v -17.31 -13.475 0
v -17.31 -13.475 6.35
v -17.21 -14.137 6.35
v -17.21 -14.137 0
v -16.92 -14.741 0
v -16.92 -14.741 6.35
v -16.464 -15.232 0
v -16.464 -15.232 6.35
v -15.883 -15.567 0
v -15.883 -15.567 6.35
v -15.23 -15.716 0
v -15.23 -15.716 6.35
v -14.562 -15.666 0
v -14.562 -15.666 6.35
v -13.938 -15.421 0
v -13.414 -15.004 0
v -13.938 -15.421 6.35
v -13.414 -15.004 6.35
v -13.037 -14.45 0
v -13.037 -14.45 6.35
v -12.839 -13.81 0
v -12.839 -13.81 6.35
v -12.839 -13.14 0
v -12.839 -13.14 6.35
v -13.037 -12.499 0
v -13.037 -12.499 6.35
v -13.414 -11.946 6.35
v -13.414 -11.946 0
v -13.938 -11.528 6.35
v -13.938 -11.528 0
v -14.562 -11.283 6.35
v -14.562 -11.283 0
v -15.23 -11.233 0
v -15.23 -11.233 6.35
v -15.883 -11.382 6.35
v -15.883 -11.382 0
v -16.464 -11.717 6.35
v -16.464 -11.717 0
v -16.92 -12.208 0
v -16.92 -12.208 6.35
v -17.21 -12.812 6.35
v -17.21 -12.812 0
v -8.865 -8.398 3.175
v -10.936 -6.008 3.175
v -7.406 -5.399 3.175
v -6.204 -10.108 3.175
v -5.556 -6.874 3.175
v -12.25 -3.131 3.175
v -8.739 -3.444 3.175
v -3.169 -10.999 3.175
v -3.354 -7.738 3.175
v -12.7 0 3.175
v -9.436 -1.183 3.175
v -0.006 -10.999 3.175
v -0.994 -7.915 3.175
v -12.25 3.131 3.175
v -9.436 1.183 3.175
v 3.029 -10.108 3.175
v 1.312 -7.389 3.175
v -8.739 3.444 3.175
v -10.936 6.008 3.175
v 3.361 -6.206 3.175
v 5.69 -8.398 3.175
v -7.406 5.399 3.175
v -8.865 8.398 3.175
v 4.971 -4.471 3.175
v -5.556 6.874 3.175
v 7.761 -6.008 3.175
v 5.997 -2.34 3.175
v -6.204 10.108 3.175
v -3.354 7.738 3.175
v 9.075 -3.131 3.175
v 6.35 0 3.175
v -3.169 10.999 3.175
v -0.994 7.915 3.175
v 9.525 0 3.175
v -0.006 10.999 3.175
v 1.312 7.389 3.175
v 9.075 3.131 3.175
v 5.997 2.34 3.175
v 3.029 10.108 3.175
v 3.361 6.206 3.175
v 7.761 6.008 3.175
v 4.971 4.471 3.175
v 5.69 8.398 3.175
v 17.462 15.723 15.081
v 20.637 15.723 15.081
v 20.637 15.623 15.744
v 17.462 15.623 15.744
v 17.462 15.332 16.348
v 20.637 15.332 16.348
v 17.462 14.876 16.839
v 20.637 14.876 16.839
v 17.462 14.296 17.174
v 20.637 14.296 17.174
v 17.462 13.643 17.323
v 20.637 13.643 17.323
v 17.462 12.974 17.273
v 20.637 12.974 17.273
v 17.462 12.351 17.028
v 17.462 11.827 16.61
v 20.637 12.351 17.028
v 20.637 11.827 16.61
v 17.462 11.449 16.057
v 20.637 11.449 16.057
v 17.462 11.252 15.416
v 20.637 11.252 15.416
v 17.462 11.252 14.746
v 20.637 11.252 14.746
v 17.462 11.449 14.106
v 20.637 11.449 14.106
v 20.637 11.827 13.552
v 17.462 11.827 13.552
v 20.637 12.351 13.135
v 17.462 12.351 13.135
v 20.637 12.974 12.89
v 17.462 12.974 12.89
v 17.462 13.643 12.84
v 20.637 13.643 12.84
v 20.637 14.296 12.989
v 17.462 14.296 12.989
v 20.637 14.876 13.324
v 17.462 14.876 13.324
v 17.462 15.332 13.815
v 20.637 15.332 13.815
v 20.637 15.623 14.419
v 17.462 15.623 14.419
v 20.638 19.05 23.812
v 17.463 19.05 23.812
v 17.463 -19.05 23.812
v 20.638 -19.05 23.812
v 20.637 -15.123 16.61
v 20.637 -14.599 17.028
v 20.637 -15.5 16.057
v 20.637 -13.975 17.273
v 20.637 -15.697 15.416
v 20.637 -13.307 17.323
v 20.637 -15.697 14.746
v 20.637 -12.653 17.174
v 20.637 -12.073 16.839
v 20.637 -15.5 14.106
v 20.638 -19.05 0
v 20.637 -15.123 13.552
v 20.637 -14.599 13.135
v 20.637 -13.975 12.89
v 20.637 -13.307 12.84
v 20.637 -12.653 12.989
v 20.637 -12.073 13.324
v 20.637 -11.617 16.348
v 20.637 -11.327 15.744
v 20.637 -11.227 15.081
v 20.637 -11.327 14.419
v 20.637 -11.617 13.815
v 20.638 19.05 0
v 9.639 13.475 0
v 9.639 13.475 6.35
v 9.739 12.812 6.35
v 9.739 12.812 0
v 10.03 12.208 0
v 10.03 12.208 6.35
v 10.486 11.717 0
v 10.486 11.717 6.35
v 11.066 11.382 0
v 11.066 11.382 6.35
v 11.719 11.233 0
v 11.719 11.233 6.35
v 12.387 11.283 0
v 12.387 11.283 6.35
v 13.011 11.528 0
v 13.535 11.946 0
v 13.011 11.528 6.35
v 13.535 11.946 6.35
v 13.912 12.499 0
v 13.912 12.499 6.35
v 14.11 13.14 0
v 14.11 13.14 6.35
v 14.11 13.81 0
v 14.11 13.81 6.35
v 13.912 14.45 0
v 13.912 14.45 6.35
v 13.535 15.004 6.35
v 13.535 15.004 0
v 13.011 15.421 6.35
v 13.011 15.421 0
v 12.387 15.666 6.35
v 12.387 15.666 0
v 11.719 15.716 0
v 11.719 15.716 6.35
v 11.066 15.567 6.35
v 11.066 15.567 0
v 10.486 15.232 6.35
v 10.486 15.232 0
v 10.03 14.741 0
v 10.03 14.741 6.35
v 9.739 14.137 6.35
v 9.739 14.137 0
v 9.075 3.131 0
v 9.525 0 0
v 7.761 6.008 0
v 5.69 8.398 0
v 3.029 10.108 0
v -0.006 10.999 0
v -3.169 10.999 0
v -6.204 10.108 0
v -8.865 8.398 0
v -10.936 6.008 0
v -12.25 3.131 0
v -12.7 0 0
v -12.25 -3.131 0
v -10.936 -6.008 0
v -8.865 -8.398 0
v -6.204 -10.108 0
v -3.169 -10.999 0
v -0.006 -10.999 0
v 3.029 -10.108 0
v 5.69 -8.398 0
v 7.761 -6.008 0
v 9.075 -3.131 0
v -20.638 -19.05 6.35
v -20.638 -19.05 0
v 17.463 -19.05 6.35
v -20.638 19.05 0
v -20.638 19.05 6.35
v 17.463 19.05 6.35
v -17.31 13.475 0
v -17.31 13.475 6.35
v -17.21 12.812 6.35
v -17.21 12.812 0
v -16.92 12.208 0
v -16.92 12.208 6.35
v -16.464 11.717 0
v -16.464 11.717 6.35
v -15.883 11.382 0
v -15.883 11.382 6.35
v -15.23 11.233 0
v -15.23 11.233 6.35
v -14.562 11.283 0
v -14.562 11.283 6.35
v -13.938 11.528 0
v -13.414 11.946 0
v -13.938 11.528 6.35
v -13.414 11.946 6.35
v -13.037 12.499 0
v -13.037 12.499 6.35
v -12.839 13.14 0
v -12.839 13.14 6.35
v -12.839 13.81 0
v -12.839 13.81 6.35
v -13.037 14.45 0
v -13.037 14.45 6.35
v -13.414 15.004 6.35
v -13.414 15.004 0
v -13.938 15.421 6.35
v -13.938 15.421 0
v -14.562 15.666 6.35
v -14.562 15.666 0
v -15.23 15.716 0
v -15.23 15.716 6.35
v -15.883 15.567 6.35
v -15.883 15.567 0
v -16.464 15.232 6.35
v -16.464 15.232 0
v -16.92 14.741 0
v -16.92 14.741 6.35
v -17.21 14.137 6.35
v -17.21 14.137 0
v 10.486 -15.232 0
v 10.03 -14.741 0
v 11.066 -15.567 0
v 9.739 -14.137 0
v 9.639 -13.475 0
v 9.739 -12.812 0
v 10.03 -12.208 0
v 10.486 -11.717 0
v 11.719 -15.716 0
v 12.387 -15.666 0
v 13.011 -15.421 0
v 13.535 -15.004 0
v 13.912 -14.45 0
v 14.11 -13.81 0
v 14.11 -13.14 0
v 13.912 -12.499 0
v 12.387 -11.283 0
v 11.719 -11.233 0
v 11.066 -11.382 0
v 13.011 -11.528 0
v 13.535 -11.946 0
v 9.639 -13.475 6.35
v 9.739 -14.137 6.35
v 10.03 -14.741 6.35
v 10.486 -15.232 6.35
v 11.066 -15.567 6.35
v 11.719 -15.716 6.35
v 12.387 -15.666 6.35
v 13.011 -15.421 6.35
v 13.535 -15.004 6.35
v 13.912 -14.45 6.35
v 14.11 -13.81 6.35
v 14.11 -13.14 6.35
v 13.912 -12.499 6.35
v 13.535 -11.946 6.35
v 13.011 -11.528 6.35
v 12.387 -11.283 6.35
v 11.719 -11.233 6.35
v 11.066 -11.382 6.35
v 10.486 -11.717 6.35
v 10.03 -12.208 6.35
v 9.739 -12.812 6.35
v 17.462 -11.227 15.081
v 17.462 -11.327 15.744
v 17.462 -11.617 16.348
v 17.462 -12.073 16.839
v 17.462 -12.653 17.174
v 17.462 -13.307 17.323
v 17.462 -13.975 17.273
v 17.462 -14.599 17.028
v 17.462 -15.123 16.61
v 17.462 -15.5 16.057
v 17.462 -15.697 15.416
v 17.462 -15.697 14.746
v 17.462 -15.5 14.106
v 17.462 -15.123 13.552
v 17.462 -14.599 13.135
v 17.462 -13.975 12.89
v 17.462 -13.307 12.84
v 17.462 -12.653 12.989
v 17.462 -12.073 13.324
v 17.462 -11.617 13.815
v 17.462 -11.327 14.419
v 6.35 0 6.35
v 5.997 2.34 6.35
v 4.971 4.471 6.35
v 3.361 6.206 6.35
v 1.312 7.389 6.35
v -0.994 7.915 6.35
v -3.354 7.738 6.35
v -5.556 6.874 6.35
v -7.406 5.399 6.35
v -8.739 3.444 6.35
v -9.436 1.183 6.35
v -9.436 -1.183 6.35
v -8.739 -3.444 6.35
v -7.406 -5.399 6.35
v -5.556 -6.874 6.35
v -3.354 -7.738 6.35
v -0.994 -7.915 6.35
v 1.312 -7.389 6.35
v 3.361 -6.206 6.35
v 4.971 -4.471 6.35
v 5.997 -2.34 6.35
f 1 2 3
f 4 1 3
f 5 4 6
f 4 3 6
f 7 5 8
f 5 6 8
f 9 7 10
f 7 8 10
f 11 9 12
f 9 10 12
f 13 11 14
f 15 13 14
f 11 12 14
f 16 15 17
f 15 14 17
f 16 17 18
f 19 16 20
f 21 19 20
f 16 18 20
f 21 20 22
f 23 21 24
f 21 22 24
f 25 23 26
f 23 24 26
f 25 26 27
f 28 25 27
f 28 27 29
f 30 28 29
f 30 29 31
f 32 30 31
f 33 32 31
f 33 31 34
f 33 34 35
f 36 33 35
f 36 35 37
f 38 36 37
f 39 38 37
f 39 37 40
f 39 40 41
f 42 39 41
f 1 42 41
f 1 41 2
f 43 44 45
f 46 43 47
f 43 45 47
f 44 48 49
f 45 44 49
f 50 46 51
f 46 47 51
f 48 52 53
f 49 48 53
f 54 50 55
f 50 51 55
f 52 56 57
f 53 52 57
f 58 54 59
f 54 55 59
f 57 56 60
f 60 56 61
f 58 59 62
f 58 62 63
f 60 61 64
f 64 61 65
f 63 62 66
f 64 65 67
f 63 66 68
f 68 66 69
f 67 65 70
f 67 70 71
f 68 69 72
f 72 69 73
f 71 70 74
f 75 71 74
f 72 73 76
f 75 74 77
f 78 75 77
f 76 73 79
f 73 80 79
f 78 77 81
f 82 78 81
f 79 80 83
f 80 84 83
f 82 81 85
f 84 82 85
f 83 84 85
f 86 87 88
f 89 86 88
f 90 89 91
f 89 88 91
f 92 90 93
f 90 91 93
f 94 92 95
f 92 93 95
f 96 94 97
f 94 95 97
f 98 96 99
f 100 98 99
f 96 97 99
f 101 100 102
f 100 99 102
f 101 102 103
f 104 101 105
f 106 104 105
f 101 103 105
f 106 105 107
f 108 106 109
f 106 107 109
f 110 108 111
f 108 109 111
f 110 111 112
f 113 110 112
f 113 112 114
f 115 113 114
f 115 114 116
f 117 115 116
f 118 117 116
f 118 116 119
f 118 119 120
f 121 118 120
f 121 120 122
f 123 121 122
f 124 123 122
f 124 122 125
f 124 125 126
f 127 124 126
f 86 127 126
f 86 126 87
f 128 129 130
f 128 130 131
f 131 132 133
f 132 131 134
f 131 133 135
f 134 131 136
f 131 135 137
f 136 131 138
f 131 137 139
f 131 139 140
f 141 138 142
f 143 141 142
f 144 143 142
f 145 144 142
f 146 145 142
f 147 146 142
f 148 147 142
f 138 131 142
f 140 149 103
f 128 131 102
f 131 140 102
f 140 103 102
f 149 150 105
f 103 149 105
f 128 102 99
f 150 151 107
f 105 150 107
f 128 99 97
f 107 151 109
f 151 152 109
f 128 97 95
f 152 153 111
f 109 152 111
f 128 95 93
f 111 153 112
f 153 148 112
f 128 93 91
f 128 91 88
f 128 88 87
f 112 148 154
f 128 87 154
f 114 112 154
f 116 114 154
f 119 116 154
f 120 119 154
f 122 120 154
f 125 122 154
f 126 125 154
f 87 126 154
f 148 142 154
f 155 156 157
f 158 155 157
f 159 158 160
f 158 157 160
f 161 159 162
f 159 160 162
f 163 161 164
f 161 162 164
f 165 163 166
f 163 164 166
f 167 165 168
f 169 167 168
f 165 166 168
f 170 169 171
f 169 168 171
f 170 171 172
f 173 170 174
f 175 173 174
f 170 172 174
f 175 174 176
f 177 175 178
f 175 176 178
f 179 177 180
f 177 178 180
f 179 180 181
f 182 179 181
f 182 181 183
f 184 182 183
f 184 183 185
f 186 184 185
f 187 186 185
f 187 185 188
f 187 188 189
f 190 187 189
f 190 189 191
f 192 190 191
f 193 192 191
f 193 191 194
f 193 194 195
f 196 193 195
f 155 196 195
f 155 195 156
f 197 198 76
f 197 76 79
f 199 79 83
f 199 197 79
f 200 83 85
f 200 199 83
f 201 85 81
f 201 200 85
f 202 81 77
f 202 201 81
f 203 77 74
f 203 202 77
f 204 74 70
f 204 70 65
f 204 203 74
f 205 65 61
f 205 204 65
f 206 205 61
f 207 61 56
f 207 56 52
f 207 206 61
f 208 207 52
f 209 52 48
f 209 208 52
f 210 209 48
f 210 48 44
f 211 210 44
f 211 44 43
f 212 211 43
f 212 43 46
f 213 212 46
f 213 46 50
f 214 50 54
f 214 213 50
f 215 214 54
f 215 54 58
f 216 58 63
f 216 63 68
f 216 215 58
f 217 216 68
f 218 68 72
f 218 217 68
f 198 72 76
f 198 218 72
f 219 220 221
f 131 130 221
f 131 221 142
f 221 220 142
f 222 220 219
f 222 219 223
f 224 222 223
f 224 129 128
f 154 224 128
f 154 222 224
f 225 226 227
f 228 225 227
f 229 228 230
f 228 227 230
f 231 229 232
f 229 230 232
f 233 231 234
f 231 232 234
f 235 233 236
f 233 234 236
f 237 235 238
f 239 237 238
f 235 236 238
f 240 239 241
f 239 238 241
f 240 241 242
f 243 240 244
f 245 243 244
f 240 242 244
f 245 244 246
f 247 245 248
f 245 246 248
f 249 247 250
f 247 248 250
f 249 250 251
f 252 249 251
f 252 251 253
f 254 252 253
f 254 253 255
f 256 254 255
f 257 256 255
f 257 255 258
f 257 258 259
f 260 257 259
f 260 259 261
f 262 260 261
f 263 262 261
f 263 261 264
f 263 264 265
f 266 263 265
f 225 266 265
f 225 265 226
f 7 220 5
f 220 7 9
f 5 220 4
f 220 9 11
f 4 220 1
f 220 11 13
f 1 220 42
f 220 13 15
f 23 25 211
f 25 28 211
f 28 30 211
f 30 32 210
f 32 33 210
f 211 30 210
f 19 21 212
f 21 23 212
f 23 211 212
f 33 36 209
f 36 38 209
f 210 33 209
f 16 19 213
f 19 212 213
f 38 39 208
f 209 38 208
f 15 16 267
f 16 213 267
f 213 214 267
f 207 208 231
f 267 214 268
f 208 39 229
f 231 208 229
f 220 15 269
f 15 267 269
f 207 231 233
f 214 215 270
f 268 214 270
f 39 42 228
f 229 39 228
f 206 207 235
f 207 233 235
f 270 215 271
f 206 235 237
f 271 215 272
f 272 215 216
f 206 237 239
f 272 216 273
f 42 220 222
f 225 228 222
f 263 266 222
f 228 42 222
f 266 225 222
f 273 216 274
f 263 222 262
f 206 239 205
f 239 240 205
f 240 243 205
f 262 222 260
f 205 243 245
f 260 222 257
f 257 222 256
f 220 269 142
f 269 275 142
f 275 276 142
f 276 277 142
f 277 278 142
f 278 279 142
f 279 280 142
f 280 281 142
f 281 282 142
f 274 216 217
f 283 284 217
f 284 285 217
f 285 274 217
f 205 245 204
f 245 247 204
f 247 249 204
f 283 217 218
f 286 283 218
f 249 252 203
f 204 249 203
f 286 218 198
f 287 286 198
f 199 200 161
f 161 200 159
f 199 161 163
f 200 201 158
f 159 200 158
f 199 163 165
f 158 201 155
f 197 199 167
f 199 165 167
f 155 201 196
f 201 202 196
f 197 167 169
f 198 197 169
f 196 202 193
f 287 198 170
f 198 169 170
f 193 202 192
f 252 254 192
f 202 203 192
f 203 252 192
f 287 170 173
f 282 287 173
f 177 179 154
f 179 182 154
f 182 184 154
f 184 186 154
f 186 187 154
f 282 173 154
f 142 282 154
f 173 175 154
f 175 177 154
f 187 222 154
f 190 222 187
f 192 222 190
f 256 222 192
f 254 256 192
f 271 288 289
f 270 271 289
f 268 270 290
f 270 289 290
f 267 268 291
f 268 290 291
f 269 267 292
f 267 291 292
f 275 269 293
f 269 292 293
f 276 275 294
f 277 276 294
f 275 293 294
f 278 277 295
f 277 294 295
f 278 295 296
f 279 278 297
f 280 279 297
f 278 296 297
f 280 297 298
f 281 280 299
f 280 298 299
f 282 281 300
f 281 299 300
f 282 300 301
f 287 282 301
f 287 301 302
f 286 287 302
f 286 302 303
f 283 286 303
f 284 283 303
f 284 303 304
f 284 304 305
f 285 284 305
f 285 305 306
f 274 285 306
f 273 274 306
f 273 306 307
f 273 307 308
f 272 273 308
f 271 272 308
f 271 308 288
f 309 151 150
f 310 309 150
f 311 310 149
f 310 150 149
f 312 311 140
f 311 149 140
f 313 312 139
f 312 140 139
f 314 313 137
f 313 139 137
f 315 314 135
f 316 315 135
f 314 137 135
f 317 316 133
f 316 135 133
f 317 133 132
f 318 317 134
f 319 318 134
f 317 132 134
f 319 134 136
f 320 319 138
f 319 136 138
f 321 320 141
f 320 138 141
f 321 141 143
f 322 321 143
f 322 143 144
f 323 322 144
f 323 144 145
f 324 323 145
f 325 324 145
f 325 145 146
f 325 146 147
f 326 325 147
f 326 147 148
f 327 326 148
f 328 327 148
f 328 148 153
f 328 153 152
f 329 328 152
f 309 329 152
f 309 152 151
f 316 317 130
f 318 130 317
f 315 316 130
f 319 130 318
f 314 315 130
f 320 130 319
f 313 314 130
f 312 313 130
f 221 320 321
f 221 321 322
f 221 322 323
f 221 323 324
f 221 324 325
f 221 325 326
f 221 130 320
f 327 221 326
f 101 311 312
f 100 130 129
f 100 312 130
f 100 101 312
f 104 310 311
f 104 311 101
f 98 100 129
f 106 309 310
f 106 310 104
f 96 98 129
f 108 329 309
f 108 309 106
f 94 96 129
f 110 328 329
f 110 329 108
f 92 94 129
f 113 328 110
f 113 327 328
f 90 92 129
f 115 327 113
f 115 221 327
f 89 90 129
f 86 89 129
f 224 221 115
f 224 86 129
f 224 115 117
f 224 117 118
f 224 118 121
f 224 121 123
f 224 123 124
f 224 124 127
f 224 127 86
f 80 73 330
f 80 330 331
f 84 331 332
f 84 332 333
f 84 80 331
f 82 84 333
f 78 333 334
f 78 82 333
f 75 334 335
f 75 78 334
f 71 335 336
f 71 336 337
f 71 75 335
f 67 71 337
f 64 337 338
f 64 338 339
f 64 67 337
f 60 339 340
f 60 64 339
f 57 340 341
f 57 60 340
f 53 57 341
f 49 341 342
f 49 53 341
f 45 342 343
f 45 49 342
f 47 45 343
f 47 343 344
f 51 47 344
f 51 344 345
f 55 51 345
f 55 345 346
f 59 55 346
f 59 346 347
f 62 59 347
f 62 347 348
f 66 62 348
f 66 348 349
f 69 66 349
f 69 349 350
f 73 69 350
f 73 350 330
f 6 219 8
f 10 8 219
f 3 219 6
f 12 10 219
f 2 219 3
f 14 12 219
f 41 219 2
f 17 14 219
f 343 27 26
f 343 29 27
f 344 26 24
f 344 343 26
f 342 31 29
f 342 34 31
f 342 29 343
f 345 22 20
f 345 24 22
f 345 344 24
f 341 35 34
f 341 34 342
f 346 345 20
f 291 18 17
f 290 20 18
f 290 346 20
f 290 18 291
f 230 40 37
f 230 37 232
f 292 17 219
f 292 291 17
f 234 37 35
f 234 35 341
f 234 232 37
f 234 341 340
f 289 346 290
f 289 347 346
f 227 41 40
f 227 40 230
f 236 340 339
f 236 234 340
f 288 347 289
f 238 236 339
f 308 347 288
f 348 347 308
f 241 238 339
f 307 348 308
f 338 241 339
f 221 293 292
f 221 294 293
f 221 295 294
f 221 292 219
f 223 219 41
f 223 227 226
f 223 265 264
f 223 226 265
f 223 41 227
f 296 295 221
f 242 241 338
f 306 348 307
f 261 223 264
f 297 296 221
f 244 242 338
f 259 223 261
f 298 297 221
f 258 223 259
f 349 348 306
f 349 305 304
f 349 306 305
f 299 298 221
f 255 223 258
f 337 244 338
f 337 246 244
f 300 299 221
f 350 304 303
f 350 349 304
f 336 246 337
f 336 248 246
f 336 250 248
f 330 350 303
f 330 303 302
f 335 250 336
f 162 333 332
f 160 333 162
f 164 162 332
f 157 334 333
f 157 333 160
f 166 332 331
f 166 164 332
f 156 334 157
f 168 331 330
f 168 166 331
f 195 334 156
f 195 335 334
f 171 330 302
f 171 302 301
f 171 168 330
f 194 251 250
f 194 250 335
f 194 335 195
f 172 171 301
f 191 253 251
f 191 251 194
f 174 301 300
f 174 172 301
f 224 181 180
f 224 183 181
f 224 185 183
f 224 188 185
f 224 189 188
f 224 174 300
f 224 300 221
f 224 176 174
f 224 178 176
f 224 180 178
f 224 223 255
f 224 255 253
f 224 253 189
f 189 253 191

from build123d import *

# Parameters (mm, degrees)
F0_W      = 3.175
F0_H      = 38.1
F1_DEPTH  = 23.8125
F0_W_2    = 38.1
F0_R      = 11.1125
F0_R_2    = 7.9375
F2_DEPTH  = 6.35
F4_D      = 4.4958
F5_D      = 4.4958
F6_D      = 4.4958
F7_D      = 4.4958
F8_D      = 4.4958
F9_D      = 4.4958
F10_DEPTH = 3.175


with BuildPart() as f1:
    # F0 (on Top) → F1 (new body)
    with BuildSketch(Plane.XY):
        with Locations((19.05, 0)):
            Rectangle(F0_W, F0_H)
    extrude(amount=F1_DEPTH)

    # F0 (on Top) → F2 (join)
    with BuildSketch(Plane.XY):
        with Locations((-1.5875, 0)):
            Rectangle(F0_W_2, F0_H)
        with Locations((-1.5875, 0)):
            Circle(F0_R, mode=Mode.SUBTRACT)
        with Locations((-1.5875, 0)):
            Circle(F0_R)
        with Locations((-1.5875, 0)):
            Circle(F0_R_2, mode=Mode.SUBTRACT)
    extrude(amount=F2_DEPTH)

    # F4 (through all)
    with Locations(Plane(origin=(0, 0, 0), x_dir=(1, 0, 0), z_dir=(0, 0, -1))):
        with Locations((-15.0622, 13.4747)):
            Hole(F4_D / 2)

    # F5 (through all)
    with Locations(Plane(origin=(0, 0, 0), x_dir=(1, 0, 0), z_dir=(0, 0, -1))):
        with Locations((-15.0622, -13.4747)):
            Hole(F5_D / 2)

    # F6 (through all)
    with Locations(Plane(origin=(0, 0, 0), x_dir=(1, 0, 0), z_dir=(0, 0, -1))):
        with Locations((11.8872, -13.4747)):
            Hole(F6_D / 2)

    # F7 (through all)
    with Locations(Plane(origin=(0, 0, 0), x_dir=(1, 0, 0), z_dir=(0, 0, -1))):
        with Locations((11.8872, 13.4747)):
            Hole(F7_D / 2)

    # F8 (through all)
    with Locations(Plane(origin=(17.4625, 0, 0), x_dir=(0, -1, 0), z_dir=(-1, 0, 0))):
        with Locations((-13.4747, 15.08125)):
            Hole(F8_D / 2)

    # F9 (through all)
    with Locations(Plane(origin=(17.4625, 0, 0), x_dir=(0, -1, 0), z_dir=(-1, 0, 0))):
        with Locations((13.4747, 15.08125)):
            Hole(F9_D / 2)

    # F0 (on Top) → F10 (cut)
    with BuildSketch(Plane.XY):
        with Locations((-1.5875, 0)):
            Circle(F0_R)
        with Locations((-1.5875, 0)):
            Circle(F0_R_2, mode=Mode.SUBTRACT)
    extrude(amount=F10_DEPTH, mode=Mode.SUBTRACT)


solid = f1.part
